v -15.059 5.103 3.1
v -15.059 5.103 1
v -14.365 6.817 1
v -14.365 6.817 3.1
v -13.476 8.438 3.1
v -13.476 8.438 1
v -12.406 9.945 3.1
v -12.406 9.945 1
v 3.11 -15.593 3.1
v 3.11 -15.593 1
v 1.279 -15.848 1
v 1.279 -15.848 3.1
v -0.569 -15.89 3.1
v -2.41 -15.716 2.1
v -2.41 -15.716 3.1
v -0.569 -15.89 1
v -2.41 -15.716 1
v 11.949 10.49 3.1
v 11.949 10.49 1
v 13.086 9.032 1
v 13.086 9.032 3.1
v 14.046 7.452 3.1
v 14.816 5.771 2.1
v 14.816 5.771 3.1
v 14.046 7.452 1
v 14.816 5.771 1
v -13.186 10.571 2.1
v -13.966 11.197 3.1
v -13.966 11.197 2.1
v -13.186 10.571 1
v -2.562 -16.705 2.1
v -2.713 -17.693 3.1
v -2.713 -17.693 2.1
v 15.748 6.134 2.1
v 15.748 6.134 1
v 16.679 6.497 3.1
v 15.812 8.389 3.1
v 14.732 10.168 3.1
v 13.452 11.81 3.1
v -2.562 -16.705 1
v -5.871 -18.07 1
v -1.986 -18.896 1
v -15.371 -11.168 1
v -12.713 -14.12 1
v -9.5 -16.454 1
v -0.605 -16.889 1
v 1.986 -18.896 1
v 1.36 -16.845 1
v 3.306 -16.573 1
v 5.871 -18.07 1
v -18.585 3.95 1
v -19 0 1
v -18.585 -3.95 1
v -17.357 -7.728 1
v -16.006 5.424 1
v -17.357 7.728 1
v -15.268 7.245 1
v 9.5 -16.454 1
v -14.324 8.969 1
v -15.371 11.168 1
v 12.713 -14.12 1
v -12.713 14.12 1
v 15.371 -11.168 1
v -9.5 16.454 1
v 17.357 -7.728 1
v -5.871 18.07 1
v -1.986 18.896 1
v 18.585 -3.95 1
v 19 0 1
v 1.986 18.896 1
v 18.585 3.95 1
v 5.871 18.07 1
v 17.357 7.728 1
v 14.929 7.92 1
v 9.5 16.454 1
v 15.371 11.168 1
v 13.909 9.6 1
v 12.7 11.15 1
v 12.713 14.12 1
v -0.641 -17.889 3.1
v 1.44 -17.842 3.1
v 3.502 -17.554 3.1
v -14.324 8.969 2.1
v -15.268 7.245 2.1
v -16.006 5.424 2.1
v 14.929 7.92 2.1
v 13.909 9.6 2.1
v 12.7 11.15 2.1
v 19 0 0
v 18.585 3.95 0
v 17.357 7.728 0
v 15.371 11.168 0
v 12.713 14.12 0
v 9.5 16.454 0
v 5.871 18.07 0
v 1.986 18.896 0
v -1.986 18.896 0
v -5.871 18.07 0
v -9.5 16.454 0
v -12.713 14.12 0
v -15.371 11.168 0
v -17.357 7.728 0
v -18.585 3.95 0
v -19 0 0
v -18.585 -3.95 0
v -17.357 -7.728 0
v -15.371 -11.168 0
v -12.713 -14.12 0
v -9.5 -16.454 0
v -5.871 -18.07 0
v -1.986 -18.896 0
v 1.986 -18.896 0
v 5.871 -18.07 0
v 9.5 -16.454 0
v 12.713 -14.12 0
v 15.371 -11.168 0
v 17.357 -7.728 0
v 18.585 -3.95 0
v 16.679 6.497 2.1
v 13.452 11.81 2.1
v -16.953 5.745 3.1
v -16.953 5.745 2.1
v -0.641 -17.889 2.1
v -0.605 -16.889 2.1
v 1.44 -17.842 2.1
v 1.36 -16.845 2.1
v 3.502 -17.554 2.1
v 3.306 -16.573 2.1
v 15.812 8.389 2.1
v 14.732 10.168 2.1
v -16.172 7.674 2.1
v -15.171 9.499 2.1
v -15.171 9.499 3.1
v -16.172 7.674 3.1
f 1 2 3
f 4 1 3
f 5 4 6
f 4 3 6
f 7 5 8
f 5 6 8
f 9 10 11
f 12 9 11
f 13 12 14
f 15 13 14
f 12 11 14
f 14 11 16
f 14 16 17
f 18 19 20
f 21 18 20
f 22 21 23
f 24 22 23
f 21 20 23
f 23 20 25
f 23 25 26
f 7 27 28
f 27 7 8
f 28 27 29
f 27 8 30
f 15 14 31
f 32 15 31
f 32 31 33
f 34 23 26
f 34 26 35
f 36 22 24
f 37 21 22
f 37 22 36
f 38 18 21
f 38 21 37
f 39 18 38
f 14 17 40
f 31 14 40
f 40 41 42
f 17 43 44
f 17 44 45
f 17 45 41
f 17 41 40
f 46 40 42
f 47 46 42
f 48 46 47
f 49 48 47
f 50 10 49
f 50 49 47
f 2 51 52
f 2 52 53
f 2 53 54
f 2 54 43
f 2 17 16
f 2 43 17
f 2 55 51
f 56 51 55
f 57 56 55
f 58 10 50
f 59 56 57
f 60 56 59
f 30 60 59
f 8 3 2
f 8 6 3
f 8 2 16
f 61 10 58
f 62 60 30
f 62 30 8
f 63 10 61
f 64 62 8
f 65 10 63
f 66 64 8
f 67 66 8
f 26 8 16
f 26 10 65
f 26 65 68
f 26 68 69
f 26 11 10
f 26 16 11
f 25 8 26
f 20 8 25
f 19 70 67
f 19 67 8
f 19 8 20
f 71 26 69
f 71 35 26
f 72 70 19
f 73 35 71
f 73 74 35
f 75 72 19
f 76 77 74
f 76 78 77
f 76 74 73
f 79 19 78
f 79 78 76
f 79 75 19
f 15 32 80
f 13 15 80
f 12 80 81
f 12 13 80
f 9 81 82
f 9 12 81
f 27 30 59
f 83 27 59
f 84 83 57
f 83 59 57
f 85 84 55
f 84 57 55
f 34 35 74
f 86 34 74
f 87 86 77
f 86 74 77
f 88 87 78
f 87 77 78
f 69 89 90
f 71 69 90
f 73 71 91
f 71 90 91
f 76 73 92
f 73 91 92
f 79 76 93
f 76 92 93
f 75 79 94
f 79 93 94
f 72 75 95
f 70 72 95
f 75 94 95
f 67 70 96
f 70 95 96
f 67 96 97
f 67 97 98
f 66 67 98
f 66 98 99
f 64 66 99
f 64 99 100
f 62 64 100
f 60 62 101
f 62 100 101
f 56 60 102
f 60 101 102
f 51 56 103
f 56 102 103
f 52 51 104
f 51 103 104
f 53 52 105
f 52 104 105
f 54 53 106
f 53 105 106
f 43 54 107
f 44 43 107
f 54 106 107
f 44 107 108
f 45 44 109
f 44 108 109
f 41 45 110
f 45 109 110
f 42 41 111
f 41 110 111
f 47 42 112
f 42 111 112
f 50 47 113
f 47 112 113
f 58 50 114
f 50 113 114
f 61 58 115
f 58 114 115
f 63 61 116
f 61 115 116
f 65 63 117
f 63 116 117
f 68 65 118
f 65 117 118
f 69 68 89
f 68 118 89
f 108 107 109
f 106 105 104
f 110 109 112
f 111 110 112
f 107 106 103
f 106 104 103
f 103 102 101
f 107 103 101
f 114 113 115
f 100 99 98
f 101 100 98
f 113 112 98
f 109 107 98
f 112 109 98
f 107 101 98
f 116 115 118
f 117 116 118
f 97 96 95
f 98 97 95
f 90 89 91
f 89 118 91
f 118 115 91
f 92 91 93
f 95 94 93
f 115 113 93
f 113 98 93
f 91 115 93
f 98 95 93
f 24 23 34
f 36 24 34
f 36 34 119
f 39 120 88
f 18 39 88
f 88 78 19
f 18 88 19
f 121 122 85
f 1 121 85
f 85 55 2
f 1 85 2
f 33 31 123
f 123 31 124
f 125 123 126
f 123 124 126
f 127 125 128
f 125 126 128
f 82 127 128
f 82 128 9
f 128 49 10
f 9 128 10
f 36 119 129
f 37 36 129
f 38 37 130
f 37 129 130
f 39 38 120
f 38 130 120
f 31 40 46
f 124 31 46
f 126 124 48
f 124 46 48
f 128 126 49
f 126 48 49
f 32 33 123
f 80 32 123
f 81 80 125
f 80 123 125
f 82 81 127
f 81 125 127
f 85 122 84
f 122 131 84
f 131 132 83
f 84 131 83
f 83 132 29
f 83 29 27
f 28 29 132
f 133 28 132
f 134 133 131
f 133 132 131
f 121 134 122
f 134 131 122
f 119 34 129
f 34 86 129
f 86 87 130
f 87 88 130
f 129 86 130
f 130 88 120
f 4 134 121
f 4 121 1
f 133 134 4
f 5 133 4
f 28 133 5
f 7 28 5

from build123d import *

# Parameters (mm, degrees)
F0_R     = 19
F1_DEPTH = 1
F3_DEPTH = 1.1
F5_DEPTH = 1


with BuildPart() as f1:
    # F0 (on Top) → F1 (new body)
    with BuildSketch(Plane.XY):
        Circle(F0_R)
    extrude(amount=F1_DEPTH)

    # F2 (on face) → F3 (join)
    with BuildSketch(Plane.XY.offset(1)):
        with BuildLine():
            Line((14.815816, 5.770752), (15.747629, 6.133693))
            ThreePointArc((15.747629, 6.133693), (14.443282, 8.775055), (12.700084, 11.149792))
            Line((12.700084, 11.149792), (11.9486, 10.490041))
            ThreePointArc((11.9486, 10.490041), (13.58865, 8.255821), (14.815816, 5.770752))
        make_face()
        with BuildLine():
            ThreePointArc((-15.058942, 5.102771), (-13.944076, 7.640206), (-12.405526, 9.945497))
            Line((-12.405526, 9.945497), (-13.185748, 10.571))
            ThreePointArc((-13.185748, 10.571), (-14.821062, 8.120722), (-16.006045, 5.4237))
            Line((-16.006045, 5.4237), (-15.058942, 5.102771))
        make_face()
        with BuildLine():
            ThreePointArc((3.110342, -15.592812), (0.355426, -15.896027), (-2.41029, -15.71625))
            Line((-2.41029, -15.71625), (-2.561881, -16.704693))
            ThreePointArc((-2.561881, -16.704693), (0.377779, -16.895777), (3.305961, -16.573492))
            Line((3.305961, -16.573492), (3.110342, -15.592812))
        make_face()
    extrude(amount=F3_DEPTH)

    # F4 (on face) → F5 (join)
    with BuildSketch(Plane.XY.offset(2.1)):
        with BuildLine():
            ThreePointArc((-15.058942, 5.102771), (-13.944076, 7.640206), (-12.405526, 9.945497))
            Line((-12.405526, 9.945497), (-13.96597, 11.196503))
            ThreePointArc((-13.96597, 11.196503), (-15.698048, 8.601238), (-16.953148, 5.744629))
            Line((-16.953148, 5.744629), (-15.058942, 5.102771))
        make_face()
        with BuildLine():
            Line((-2.41029, -15.71625), (-2.713471, -17.693136))
            ThreePointArc((-2.713471, -17.693136), (0.400133, -17.895527), (3.50158, -17.554172))
            Line((3.50158, -17.554172), (3.110342, -15.592812))
            ThreePointArc((3.110342, -15.592812), (0.355426, -15.896027), (-2.41029, -15.71625))
        make_face()
        with BuildLine():
            Line((14.815816, 5.770752), (16.679441, 6.496633))
            ThreePointArc((16.679441, 6.496633), (15.297915, 9.294289), (13.451568, 11.809543))
            Line((13.451568, 11.809543), (11.9486, 10.490041))
            ThreePointArc((11.9486, 10.490041), (13.58865, 8.255821), (14.815816, 5.770752))
        make_face()
    extrude(amount=F5_DEPTH)


solid = f1.part
